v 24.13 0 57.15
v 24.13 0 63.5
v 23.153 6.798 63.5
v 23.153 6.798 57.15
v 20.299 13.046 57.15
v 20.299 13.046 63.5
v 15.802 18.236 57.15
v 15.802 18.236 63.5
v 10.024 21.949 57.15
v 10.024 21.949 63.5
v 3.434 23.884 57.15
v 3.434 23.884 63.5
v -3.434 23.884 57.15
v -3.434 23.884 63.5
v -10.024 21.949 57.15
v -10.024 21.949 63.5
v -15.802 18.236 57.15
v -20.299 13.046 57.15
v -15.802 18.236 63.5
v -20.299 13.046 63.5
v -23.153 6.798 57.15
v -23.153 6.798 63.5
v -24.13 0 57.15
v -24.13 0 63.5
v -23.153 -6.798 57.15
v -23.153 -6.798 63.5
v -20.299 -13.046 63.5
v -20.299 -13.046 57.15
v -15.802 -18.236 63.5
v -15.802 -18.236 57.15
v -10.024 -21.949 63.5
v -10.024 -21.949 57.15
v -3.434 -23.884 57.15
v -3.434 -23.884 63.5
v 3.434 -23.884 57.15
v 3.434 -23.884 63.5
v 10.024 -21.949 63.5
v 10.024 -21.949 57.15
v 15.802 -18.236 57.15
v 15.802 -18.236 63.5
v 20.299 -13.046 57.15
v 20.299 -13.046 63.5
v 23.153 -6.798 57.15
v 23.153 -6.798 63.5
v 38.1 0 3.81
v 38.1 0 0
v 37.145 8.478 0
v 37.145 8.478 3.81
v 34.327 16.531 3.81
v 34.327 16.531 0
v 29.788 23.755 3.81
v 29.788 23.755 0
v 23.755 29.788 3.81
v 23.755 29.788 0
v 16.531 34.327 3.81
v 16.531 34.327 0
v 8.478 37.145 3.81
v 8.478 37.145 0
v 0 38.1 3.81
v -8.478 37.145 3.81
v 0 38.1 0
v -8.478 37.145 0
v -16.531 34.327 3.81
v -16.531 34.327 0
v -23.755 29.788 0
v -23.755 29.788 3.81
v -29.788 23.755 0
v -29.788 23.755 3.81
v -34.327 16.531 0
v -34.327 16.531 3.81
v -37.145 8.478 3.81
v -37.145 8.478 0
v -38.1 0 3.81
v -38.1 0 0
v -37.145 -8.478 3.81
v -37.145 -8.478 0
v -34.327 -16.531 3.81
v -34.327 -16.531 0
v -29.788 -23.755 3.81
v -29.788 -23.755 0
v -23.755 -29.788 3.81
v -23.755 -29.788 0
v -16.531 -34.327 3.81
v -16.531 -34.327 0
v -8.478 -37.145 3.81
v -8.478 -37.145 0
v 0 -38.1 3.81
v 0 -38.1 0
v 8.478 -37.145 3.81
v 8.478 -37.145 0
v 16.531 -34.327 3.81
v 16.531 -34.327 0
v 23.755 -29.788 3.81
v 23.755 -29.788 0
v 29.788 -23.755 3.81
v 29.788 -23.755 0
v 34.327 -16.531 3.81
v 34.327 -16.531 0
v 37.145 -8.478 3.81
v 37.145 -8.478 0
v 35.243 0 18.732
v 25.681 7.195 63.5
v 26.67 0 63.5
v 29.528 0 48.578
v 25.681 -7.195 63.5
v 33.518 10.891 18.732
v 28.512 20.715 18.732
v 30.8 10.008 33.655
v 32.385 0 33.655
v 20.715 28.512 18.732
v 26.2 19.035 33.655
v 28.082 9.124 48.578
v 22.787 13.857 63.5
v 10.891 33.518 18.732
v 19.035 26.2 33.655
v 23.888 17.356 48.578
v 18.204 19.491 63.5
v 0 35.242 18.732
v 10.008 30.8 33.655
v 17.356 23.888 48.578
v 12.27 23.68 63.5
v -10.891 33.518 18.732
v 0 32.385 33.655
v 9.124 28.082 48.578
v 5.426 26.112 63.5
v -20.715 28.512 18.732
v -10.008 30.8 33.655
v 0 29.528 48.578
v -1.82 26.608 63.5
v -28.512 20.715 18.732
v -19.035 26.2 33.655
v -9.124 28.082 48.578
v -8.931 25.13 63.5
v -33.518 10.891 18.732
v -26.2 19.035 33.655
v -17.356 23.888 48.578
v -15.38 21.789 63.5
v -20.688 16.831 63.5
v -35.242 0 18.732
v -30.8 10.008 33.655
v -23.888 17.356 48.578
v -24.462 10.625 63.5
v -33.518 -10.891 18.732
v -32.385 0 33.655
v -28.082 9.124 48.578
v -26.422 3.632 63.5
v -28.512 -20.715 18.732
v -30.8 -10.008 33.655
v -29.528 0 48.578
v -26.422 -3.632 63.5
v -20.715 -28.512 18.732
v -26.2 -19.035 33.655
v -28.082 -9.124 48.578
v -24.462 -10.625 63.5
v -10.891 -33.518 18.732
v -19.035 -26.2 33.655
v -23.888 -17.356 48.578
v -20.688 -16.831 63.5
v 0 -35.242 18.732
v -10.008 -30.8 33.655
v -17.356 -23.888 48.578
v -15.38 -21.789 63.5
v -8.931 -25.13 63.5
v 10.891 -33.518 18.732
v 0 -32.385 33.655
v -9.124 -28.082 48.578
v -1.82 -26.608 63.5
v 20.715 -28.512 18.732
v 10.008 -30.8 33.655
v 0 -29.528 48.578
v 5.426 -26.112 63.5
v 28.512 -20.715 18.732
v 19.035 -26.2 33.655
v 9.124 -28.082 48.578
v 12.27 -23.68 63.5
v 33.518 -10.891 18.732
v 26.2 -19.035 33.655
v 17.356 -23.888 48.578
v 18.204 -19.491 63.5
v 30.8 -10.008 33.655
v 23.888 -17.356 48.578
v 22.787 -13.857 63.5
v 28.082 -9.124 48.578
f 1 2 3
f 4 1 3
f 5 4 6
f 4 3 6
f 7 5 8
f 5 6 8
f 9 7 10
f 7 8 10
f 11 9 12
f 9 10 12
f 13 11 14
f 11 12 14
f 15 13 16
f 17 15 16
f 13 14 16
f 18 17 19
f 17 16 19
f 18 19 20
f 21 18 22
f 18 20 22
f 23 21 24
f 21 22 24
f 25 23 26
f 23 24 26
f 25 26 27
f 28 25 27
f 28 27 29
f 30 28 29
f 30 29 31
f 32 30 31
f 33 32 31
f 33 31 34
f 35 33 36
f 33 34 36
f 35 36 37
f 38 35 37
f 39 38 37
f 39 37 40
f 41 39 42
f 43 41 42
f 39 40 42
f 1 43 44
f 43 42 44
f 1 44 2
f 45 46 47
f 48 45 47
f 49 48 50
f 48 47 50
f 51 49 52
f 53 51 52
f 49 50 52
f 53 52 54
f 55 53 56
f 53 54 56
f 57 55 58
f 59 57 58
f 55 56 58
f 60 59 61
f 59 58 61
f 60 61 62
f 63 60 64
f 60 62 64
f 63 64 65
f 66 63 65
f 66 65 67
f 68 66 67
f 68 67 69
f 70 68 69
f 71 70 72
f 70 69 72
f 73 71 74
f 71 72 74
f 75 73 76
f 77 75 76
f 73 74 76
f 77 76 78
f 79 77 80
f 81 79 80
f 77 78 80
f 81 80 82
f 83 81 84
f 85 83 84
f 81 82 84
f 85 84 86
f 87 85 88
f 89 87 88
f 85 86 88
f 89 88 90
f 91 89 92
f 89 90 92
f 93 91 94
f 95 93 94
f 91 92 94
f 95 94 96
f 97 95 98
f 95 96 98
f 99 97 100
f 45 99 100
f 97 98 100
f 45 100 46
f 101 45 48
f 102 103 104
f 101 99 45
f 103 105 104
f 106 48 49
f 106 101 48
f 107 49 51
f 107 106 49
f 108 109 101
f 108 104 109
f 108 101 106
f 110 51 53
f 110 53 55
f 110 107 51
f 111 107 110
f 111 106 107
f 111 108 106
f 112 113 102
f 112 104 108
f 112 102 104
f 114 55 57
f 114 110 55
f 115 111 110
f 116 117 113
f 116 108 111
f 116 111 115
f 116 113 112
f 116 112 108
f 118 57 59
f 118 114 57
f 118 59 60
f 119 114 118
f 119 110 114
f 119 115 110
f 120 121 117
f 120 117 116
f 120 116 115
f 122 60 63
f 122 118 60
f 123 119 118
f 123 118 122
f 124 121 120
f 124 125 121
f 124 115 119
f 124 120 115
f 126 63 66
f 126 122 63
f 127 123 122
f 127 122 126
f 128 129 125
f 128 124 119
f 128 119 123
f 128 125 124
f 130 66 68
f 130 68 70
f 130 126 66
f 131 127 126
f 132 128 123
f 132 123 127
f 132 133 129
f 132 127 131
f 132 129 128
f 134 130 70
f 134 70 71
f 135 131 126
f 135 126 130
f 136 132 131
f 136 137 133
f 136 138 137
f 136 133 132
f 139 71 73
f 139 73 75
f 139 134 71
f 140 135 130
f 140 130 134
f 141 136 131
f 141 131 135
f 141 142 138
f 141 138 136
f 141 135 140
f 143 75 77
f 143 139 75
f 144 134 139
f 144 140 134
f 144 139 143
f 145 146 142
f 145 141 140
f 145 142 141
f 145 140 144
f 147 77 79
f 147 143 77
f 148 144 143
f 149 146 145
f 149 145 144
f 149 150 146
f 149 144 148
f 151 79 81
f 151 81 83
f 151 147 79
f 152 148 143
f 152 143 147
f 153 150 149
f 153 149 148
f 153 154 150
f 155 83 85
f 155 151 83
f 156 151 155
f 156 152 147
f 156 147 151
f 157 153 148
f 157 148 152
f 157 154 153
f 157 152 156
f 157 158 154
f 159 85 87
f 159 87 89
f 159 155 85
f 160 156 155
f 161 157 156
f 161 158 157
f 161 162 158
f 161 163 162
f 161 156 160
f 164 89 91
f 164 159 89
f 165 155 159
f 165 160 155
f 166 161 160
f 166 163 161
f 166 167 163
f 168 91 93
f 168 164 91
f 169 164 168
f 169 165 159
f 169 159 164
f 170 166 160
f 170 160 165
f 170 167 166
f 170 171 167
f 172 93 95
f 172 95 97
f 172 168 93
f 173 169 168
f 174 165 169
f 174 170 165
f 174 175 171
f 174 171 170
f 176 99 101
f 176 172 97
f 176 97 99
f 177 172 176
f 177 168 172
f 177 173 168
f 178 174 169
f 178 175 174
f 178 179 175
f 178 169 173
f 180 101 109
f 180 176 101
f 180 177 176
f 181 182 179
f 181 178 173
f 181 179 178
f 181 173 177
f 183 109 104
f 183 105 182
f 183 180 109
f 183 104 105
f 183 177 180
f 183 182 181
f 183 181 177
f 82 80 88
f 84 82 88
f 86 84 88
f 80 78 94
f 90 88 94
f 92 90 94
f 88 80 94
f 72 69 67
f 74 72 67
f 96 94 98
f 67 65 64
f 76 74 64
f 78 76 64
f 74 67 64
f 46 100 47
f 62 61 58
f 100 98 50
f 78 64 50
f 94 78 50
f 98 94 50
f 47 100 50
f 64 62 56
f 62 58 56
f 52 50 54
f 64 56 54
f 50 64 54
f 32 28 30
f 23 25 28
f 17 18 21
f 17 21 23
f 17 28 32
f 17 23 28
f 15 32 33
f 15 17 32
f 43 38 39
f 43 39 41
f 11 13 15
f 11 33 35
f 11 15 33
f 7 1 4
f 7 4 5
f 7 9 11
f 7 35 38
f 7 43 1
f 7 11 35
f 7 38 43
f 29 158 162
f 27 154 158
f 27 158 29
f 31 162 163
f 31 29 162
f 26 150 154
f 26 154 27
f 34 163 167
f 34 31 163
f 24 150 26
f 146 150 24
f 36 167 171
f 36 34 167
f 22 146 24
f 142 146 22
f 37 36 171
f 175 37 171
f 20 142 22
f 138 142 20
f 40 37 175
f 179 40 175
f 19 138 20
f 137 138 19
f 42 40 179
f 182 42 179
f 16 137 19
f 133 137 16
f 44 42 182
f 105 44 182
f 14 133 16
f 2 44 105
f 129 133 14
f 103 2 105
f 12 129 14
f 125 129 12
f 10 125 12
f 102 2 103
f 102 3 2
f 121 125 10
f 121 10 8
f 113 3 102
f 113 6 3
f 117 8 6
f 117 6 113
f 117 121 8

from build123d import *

# Parameters (mm, degrees)
F0_R      = 38.1
F1_DEPTH  = 3.81
F1_FACE_R = 38.1
F3_R      = 26.67
F5_R      = 24.13
F6_DEPTH  = 6.35


with BuildPart() as f1:
    # F0 (on Top) → F1 (new body)
    with BuildSketch(Plane.XY):
        Circle(F0_R)
    extrude(amount=F1_DEPTH)

    # F1_face (on face) → F4 section 0
    with BuildSketch(Plane.XY.offset(3.81)):
        Circle(F1_FACE_R)
    # F3 (on offset) → F4 section 1
    with BuildSketch(Plane.XY.offset(63.5)):
        Circle(F3_R)
    loft()

    # F5 (on face) → F6 (cut)
    with BuildSketch(Plane.XY.offset(63.5)):
        Circle(F5_R)
    extrude(amount=-F6_DEPTH, mode=Mode.SUBTRACT)


solid = f1.part
